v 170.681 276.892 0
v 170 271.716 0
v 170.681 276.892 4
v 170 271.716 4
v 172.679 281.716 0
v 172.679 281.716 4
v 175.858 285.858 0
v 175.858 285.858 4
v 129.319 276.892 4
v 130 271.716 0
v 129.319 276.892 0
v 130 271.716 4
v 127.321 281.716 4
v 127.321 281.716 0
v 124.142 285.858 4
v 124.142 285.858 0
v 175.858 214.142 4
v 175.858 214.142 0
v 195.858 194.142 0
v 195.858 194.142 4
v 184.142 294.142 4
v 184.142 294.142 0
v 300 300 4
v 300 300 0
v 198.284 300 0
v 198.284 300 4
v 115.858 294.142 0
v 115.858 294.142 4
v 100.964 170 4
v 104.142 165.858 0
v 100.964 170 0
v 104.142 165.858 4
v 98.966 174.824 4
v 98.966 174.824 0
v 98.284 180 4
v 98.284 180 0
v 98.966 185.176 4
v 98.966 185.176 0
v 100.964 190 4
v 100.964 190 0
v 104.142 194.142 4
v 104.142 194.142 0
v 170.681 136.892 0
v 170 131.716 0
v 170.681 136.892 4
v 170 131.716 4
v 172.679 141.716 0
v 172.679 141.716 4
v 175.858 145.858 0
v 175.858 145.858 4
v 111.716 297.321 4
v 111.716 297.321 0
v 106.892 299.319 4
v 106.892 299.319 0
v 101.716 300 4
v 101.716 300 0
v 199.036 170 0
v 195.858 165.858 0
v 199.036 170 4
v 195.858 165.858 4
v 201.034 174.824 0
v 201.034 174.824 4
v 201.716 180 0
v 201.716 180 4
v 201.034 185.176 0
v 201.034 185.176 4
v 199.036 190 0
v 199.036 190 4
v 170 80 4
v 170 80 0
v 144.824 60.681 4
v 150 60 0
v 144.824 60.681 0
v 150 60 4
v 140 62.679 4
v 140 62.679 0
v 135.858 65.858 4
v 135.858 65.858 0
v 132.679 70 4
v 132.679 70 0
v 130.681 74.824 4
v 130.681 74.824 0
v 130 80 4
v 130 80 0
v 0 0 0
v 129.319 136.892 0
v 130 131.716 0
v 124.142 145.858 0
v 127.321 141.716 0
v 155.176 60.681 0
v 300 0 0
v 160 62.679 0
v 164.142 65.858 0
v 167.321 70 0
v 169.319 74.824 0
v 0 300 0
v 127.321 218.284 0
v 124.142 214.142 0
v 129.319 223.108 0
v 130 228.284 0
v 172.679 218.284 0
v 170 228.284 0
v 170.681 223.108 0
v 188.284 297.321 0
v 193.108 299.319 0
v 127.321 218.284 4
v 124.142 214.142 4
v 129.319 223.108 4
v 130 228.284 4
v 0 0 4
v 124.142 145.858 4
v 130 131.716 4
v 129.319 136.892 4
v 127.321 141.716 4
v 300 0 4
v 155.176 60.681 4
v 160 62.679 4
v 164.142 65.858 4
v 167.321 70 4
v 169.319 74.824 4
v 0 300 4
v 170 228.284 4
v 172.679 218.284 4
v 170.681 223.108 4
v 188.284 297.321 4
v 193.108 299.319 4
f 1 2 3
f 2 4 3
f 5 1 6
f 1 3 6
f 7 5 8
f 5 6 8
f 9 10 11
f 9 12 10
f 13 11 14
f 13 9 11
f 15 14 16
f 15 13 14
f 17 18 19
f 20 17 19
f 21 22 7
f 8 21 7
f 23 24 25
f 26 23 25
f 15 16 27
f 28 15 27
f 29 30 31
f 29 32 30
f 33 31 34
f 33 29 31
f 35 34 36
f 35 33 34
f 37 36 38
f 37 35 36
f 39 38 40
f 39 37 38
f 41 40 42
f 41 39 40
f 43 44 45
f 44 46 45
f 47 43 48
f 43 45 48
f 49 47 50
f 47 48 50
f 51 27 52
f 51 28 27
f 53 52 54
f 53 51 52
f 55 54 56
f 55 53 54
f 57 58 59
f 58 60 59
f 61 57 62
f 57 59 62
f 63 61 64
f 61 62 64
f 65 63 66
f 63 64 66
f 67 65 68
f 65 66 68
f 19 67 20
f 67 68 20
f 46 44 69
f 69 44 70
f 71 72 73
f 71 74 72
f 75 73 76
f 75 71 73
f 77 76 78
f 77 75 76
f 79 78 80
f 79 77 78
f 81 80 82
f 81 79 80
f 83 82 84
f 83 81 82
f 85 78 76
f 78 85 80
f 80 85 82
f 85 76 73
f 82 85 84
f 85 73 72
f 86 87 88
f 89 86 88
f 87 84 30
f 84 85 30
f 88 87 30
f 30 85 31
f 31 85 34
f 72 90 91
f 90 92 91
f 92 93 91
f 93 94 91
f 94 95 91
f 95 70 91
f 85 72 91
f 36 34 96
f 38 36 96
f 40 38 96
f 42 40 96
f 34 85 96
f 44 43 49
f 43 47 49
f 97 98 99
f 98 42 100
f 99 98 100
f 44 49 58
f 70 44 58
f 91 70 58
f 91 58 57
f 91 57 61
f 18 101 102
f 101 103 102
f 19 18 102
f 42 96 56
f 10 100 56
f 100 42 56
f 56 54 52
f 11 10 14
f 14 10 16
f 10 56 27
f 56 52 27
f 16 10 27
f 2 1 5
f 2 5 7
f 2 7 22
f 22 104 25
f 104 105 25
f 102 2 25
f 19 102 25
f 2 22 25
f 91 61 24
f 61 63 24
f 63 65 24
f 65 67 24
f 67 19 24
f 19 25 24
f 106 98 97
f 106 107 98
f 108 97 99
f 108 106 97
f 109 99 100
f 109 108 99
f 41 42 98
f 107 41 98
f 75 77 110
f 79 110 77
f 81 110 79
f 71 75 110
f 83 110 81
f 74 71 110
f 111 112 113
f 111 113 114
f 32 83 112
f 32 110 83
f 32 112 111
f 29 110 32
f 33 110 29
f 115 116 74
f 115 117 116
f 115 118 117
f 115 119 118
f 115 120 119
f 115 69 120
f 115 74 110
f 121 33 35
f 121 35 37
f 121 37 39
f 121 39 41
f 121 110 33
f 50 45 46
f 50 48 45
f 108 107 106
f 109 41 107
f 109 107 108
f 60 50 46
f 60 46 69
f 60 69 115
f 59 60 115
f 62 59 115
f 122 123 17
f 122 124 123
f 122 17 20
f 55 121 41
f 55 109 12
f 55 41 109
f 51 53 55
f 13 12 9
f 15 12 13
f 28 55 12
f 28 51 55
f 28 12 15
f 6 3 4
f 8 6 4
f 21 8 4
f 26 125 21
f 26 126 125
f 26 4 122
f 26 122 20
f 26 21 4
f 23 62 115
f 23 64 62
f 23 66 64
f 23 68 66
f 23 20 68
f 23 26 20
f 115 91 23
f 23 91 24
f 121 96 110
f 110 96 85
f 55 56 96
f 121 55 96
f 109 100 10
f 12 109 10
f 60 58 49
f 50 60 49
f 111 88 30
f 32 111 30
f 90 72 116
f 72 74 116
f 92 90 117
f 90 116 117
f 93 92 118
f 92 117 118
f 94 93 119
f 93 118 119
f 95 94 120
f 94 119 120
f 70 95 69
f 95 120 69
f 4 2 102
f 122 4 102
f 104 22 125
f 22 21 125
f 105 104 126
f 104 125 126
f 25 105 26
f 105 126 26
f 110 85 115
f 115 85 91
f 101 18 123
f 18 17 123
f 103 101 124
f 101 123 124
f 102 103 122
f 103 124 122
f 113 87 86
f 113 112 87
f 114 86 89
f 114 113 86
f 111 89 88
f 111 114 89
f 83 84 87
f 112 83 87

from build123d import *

# Parameters (mm, degrees)
F1_DEPTH = 4
F2_R     = 20
F3_R     = 19.99999


# Not quite as in the source:
# - a fillet or chamfer is up to 0.001 mm smaller than in the source, because OpenCascade refuses the exact size


with BuildPart() as f1:
    # F0 (on Top) → F1 (new body)
    with BuildSketch(Plane.XY):
        Polygon((0, 300), (0, 0), (150, 0), (150, 60), (130, 60), (130, 140), (90, 180), (130, 220), (130, 280), (110, 300), align=None)
        Polygon((150, 60), (150, 0), (300, 0), (300, 300), (190, 300), (170, 280), (170, 220), (210, 180), (170, 140), (170, 60), align=None)
    extrude(amount=F1_DEPTH)

    # F2
    f2_edges = [f1.edges().sort_by_distance(p)[0] for p in [
        (130, 60, 2),
        (130, 140, 2),
        (90, 180, 2),
        (130, 220, 2),
        (130, 280, 2),
        (110, 300, 2),
    ]]
    fillet(f2_edges, radius=F2_R)

    # F3 (radius 20 in the source; OpenCascade refuses exactly that, so slightly less here)
    f3_edges = [f1.edges().sort_by_distance(p)[0] for p in [
        (190, 300, 2),
        (170, 280, 2),
        (170, 220, 2),
        (210, 180, 2),
        (170, 140, 2),
        (170, 60, 2),
    ]]
    fillet(f3_edges, radius=F3_R)


solid = f1.part
